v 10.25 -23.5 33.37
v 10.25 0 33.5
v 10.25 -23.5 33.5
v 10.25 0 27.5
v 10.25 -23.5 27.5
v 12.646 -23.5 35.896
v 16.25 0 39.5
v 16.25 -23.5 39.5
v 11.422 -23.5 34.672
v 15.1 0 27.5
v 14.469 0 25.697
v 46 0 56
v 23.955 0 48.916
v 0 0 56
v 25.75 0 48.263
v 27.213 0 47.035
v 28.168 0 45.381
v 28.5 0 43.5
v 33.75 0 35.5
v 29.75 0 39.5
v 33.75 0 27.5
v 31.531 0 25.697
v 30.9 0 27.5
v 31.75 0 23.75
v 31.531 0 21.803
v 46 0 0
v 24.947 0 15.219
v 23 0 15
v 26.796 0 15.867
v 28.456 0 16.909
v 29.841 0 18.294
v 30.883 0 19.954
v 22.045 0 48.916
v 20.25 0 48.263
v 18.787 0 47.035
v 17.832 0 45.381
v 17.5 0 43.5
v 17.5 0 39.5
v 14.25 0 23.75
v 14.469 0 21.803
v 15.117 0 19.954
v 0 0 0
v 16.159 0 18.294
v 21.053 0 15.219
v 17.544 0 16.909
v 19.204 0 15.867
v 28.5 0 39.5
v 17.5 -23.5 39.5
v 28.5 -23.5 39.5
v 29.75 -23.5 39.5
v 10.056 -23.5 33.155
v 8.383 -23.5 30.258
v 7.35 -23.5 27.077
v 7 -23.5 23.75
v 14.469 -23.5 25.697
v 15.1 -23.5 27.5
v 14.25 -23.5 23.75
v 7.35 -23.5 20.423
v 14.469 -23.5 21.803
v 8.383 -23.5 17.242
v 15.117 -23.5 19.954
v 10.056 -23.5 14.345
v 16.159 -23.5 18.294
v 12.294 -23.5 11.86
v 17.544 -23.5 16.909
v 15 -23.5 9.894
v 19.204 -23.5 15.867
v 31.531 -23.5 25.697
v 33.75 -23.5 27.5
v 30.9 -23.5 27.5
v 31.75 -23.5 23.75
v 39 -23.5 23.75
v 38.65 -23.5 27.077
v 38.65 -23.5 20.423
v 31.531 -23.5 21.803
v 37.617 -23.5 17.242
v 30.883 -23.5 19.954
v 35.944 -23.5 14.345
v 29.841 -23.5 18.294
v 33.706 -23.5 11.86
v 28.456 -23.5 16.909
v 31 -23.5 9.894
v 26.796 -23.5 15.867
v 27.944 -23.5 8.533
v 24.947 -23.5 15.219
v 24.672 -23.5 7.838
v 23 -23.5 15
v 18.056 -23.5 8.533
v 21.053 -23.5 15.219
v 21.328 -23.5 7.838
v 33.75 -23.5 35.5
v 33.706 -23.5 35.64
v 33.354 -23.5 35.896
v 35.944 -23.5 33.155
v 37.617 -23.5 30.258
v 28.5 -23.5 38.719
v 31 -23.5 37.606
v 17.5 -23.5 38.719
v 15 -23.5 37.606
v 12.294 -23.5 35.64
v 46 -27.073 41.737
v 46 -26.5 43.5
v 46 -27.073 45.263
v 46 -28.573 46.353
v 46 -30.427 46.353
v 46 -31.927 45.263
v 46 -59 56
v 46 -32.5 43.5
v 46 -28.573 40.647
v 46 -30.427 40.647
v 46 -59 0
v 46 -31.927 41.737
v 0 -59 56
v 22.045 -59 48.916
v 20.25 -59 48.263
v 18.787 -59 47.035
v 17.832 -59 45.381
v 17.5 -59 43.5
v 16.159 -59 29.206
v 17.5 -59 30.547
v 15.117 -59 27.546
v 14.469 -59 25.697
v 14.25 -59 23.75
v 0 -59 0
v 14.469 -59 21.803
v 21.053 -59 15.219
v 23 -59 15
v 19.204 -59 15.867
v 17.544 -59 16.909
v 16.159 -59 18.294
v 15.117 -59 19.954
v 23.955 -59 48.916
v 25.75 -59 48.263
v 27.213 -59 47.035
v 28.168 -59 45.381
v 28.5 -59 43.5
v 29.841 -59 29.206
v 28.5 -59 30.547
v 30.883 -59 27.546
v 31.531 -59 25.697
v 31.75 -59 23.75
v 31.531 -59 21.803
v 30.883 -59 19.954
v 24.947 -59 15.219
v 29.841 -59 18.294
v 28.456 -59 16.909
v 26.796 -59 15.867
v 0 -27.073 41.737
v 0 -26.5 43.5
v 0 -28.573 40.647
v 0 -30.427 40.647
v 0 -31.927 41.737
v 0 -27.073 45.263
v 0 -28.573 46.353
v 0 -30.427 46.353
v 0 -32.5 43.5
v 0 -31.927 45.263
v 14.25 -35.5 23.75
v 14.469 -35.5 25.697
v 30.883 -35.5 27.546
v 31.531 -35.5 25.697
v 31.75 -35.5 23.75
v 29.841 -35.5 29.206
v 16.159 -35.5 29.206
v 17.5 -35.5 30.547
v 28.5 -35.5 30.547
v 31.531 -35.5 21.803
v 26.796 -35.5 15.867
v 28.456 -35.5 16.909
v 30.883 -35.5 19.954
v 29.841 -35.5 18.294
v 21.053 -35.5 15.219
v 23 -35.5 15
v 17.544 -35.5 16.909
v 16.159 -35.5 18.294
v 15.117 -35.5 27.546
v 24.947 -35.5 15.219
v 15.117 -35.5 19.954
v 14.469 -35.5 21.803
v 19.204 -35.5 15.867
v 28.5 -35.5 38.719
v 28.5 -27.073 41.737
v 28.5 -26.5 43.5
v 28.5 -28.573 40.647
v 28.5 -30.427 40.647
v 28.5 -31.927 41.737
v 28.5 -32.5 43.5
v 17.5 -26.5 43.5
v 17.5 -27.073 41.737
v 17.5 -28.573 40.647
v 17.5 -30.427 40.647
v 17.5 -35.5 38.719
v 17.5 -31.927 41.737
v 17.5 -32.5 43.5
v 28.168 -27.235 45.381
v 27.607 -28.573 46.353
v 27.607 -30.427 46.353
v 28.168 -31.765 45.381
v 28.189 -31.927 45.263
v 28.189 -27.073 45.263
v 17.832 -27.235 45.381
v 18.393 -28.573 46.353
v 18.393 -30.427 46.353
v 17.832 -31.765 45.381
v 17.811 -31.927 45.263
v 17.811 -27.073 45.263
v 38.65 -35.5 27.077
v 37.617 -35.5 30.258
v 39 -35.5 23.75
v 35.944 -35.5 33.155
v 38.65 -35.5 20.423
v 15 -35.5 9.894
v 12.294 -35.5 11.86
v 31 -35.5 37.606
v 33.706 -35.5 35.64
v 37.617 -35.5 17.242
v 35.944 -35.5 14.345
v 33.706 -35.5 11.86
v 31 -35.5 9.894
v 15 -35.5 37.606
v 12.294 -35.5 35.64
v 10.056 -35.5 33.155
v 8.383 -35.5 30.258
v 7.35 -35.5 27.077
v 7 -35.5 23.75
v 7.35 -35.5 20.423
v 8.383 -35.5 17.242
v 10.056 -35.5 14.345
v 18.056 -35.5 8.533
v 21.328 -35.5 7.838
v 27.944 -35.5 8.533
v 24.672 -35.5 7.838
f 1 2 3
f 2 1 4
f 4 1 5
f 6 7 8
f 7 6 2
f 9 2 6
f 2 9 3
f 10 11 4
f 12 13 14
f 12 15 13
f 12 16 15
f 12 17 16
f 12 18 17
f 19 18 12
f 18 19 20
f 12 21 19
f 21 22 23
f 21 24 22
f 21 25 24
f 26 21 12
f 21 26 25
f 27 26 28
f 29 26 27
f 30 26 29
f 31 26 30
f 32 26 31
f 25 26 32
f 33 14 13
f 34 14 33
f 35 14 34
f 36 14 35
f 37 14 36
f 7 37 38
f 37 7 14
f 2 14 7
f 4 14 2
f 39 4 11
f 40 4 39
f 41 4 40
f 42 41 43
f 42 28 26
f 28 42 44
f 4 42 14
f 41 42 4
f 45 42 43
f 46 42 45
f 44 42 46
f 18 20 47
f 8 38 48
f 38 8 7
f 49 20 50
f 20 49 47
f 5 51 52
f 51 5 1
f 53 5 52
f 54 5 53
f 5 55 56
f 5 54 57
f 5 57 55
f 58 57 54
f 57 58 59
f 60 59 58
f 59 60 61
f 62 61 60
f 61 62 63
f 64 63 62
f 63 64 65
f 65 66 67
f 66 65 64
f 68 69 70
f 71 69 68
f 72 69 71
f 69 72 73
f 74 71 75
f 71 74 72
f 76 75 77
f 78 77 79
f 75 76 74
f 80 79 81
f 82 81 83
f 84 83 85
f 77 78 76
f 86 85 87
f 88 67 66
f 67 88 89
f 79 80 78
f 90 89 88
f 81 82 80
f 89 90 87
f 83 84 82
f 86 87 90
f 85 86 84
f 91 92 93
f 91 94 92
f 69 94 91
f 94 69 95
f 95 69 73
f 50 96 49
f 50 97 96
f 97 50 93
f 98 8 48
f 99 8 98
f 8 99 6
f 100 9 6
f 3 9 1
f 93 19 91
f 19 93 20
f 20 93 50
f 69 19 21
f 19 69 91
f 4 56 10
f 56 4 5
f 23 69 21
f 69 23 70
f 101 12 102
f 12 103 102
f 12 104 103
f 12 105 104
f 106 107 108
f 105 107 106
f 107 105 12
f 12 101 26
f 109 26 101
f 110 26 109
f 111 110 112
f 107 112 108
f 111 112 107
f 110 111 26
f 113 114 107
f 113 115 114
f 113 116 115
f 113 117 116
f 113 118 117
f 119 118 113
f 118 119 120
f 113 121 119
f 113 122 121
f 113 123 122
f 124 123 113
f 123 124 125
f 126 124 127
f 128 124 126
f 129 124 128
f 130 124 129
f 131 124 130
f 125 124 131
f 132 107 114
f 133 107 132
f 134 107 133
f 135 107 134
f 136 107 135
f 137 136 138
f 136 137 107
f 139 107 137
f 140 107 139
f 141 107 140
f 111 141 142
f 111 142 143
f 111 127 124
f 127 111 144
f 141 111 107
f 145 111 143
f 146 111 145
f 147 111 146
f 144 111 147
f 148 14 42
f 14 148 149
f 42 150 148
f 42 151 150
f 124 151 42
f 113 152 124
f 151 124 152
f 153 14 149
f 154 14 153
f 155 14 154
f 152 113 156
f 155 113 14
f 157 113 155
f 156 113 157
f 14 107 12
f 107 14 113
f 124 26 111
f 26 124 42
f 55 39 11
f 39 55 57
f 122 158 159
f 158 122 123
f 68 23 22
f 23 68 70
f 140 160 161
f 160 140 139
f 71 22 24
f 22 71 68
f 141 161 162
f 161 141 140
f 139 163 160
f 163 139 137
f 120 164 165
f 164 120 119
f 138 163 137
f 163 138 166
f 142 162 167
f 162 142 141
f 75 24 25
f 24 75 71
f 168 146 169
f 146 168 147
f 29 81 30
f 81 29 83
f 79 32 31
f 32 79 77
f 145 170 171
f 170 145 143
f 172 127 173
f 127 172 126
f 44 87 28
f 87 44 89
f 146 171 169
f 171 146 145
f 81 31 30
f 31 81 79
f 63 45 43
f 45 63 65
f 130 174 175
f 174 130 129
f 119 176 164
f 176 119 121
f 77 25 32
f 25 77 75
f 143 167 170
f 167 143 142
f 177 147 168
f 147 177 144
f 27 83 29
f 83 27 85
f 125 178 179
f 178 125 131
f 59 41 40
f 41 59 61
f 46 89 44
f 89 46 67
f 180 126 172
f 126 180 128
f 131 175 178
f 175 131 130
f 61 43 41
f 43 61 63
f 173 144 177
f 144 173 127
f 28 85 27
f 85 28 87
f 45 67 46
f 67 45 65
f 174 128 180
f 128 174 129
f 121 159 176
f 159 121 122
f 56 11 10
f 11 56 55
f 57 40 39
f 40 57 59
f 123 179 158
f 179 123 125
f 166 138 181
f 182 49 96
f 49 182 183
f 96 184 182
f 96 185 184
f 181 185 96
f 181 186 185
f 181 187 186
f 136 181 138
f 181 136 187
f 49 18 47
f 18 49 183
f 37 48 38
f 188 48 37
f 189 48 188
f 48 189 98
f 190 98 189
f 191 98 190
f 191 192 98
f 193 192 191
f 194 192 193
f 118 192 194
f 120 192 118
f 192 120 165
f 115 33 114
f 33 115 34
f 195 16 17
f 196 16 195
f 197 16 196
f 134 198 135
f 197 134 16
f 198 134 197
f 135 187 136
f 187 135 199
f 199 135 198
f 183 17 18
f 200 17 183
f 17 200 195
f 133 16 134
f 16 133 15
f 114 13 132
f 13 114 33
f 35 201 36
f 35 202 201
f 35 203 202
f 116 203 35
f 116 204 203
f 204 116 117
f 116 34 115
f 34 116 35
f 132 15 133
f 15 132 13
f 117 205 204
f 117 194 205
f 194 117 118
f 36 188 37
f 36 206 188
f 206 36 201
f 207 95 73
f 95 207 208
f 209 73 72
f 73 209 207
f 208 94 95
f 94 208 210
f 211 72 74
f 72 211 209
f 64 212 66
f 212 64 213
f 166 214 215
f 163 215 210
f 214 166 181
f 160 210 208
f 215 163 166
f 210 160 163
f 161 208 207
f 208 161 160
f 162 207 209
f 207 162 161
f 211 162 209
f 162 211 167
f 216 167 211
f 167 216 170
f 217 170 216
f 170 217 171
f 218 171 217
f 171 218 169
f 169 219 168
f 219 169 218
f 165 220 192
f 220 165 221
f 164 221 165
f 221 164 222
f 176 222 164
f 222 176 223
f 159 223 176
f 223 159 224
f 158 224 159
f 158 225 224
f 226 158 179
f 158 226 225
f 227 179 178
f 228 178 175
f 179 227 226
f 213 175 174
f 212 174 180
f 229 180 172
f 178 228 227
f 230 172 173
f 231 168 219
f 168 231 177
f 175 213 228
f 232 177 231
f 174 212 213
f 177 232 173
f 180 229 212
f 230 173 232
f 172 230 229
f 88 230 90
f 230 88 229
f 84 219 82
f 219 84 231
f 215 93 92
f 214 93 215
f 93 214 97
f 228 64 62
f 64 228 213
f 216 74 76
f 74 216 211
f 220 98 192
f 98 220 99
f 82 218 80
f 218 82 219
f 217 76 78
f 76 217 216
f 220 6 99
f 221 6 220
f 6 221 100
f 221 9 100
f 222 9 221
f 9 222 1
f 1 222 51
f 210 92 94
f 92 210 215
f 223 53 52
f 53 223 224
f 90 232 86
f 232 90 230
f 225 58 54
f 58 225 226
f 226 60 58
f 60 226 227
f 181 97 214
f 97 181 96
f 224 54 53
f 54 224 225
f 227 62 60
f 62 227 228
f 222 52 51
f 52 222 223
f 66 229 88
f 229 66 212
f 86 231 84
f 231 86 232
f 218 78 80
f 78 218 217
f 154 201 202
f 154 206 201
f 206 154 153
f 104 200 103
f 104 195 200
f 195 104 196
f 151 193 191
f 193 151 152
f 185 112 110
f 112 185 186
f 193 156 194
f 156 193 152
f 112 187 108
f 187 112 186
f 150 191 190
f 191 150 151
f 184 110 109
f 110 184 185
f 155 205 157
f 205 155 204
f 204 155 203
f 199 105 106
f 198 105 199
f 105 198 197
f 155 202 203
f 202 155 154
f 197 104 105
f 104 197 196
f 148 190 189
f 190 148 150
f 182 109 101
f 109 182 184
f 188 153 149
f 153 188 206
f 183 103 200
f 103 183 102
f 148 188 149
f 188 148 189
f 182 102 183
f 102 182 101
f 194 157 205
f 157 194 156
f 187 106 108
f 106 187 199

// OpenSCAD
// Euro Cylinder Lock Holder
// Useful for impressioning, picking
// (C) 2018 Matt Burrough
// v. 7.1 (7A)

// Units = mm

blockZ = 59;
blockX = 46;
blockY = 56;

keywayRadius = 8.75;

actuatorLength = 12;
actuatorRadius = 16;

profileRadius = 5.5;
profileHeight = 34;

M5ScrewR = 6/2;
M5ScrewHeadLen = 5;
M5ScrewHeadR = 9/2;

bottomOffset = 15;

   module prism(l, w, h){
       polyhedron(
               points=[[0,0,0], [l,0,0], [l,w,0], [0,w,0], [0,w,h], [l,w,h]],
               faces=[[0,1,2,3],[5,4,3,2],[0,4,5,1],[0,3,4],[5,2,1]]
               );
       
       // preview unfolded (do not include in your function
       z = 0.08;
       separation = 2;
       border = .2;
       translate([0,w+separation,0])
           cube([l,w,z]);
       translate([0,w+separation+w+border,0])
           cube([l,h,z]);
       translate([0,w+separation+w+border+h+border,0])
           cube([l,sqrt(w*w+h*h),z]);
       translate([l+border,w+separation+w+border+h+border,0])
           polyhedron(
                   points=[[0,0,0],[h,0,0],[0,sqrt(w*w+h*h),0], [0,0,z],[h,0,z],[0,sqrt(w*w+h*h),z]],
                   faces=[[0,1,2], [3,5,4], [0,3,4,1], [1,4,5,2], [2,5,3,0]]
                   );
       translate([0-border,w+separation+w+border+h+border,0])
           polyhedron(
                   points=[[0,0,0],[0-h,0,0],[0,sqrt(w*w+h*h),0], [0,0,z],[0-h,0,z],[0,sqrt(w*w+h*h),z]],
                   faces=[[1,0,2],[5,3,4],[0,1,4,3],[1,2,5,4],[2,0,3,5]]
                   );
       }

difference(){
rotate(90,[1,0,0])
difference(){
     // Outer Block
     cube([blockX, blockY, blockZ]);
    
    // Profile:
    // Plug circle of profile face
    translate([blockX/2, keywayRadius+bottomOffset, 0])
        cylinder(h=blockZ, r1=keywayRadius, r2=keywayRadius, center=false);
    // Mid-section of profile face
    translate([blockX/2-profileRadius,keywayRadius+bottomOffset,0])
        cube([profileRadius*2, profileHeight-keywayRadius-profileRadius, blockZ], false);
    // Top arch of profile face
    translate([blockX/2, profileHeight+bottomOffset-profileRadius, 0])
        cylinder(h=blockZ, r1=profileRadius, r2=profileRadius, center=false);
    
    
    // Cutout for actuator 
    translate([blockX/2, keywayRadius+bottomOffset, blockZ/2])
        cylinder(h=actuatorLength, r1=actuatorRadius, r2=actuatorRadius, center=true);   
    
    // Slot for actuator insertion while locked
    difference() {
        translate([blockX/2-(keywayRadius*2+8)/2, bottomOffset+12.5, 0])
        cube([keywayRadius*2+6, 12, blockZ/2-actuatorLength/2]);
        translate([blockX/2-(keywayRadius*2+8)/2, bottomOffset+18.5, blockZ/2-actuatorLength/2])
        rotate(90,[0,1,0])
        prism(blockZ/2-actuatorLength/2, 6, 6);
        
        translate([blockX/2+(keywayRadius*2+8)/2, bottomOffset+18.5, 0])
        rotate(270,[0,1,0])
        prism(blockZ/2-actuatorLength/2, 6, 6);
    }
    
        
    // Mounting Screw hole
    translate([-2, profileHeight+bottomOffset-profileRadius,(blockZ/2)])
        rotate(180, [1,0,1])
            cylinder(h=blockX+4, r1=M5ScrewR, r2=M5ScrewR, center=false);
    
    // Screw recess
    //translate([0, profileHeight+bottomOffset-profileRadius,(blockZ/2)])
     //   rotate(180, [1,0,1])
       //     cylinder(h=M5ScrewHeadLen, r1=M5ScrewHeadR, r2=M5ScrewHeadR, center=false);
}

// Slice of actuator profile
//translate([0,-6,0])
//rotate(90,[1,0,0])
//cube([blockX+1,blockY+2,blockZ]);

// Slice of front profile
//translate([0,1,0])
//rotate(90,[1,0,0])
//cube([blockX+1,blockY+2,blockZ-6]);

// Side half
//translate([blockX/2,1,0])
//rotate(90,[1,0,0])
//cube([blockX/2,blockY+2,blockZ+1]);
}
